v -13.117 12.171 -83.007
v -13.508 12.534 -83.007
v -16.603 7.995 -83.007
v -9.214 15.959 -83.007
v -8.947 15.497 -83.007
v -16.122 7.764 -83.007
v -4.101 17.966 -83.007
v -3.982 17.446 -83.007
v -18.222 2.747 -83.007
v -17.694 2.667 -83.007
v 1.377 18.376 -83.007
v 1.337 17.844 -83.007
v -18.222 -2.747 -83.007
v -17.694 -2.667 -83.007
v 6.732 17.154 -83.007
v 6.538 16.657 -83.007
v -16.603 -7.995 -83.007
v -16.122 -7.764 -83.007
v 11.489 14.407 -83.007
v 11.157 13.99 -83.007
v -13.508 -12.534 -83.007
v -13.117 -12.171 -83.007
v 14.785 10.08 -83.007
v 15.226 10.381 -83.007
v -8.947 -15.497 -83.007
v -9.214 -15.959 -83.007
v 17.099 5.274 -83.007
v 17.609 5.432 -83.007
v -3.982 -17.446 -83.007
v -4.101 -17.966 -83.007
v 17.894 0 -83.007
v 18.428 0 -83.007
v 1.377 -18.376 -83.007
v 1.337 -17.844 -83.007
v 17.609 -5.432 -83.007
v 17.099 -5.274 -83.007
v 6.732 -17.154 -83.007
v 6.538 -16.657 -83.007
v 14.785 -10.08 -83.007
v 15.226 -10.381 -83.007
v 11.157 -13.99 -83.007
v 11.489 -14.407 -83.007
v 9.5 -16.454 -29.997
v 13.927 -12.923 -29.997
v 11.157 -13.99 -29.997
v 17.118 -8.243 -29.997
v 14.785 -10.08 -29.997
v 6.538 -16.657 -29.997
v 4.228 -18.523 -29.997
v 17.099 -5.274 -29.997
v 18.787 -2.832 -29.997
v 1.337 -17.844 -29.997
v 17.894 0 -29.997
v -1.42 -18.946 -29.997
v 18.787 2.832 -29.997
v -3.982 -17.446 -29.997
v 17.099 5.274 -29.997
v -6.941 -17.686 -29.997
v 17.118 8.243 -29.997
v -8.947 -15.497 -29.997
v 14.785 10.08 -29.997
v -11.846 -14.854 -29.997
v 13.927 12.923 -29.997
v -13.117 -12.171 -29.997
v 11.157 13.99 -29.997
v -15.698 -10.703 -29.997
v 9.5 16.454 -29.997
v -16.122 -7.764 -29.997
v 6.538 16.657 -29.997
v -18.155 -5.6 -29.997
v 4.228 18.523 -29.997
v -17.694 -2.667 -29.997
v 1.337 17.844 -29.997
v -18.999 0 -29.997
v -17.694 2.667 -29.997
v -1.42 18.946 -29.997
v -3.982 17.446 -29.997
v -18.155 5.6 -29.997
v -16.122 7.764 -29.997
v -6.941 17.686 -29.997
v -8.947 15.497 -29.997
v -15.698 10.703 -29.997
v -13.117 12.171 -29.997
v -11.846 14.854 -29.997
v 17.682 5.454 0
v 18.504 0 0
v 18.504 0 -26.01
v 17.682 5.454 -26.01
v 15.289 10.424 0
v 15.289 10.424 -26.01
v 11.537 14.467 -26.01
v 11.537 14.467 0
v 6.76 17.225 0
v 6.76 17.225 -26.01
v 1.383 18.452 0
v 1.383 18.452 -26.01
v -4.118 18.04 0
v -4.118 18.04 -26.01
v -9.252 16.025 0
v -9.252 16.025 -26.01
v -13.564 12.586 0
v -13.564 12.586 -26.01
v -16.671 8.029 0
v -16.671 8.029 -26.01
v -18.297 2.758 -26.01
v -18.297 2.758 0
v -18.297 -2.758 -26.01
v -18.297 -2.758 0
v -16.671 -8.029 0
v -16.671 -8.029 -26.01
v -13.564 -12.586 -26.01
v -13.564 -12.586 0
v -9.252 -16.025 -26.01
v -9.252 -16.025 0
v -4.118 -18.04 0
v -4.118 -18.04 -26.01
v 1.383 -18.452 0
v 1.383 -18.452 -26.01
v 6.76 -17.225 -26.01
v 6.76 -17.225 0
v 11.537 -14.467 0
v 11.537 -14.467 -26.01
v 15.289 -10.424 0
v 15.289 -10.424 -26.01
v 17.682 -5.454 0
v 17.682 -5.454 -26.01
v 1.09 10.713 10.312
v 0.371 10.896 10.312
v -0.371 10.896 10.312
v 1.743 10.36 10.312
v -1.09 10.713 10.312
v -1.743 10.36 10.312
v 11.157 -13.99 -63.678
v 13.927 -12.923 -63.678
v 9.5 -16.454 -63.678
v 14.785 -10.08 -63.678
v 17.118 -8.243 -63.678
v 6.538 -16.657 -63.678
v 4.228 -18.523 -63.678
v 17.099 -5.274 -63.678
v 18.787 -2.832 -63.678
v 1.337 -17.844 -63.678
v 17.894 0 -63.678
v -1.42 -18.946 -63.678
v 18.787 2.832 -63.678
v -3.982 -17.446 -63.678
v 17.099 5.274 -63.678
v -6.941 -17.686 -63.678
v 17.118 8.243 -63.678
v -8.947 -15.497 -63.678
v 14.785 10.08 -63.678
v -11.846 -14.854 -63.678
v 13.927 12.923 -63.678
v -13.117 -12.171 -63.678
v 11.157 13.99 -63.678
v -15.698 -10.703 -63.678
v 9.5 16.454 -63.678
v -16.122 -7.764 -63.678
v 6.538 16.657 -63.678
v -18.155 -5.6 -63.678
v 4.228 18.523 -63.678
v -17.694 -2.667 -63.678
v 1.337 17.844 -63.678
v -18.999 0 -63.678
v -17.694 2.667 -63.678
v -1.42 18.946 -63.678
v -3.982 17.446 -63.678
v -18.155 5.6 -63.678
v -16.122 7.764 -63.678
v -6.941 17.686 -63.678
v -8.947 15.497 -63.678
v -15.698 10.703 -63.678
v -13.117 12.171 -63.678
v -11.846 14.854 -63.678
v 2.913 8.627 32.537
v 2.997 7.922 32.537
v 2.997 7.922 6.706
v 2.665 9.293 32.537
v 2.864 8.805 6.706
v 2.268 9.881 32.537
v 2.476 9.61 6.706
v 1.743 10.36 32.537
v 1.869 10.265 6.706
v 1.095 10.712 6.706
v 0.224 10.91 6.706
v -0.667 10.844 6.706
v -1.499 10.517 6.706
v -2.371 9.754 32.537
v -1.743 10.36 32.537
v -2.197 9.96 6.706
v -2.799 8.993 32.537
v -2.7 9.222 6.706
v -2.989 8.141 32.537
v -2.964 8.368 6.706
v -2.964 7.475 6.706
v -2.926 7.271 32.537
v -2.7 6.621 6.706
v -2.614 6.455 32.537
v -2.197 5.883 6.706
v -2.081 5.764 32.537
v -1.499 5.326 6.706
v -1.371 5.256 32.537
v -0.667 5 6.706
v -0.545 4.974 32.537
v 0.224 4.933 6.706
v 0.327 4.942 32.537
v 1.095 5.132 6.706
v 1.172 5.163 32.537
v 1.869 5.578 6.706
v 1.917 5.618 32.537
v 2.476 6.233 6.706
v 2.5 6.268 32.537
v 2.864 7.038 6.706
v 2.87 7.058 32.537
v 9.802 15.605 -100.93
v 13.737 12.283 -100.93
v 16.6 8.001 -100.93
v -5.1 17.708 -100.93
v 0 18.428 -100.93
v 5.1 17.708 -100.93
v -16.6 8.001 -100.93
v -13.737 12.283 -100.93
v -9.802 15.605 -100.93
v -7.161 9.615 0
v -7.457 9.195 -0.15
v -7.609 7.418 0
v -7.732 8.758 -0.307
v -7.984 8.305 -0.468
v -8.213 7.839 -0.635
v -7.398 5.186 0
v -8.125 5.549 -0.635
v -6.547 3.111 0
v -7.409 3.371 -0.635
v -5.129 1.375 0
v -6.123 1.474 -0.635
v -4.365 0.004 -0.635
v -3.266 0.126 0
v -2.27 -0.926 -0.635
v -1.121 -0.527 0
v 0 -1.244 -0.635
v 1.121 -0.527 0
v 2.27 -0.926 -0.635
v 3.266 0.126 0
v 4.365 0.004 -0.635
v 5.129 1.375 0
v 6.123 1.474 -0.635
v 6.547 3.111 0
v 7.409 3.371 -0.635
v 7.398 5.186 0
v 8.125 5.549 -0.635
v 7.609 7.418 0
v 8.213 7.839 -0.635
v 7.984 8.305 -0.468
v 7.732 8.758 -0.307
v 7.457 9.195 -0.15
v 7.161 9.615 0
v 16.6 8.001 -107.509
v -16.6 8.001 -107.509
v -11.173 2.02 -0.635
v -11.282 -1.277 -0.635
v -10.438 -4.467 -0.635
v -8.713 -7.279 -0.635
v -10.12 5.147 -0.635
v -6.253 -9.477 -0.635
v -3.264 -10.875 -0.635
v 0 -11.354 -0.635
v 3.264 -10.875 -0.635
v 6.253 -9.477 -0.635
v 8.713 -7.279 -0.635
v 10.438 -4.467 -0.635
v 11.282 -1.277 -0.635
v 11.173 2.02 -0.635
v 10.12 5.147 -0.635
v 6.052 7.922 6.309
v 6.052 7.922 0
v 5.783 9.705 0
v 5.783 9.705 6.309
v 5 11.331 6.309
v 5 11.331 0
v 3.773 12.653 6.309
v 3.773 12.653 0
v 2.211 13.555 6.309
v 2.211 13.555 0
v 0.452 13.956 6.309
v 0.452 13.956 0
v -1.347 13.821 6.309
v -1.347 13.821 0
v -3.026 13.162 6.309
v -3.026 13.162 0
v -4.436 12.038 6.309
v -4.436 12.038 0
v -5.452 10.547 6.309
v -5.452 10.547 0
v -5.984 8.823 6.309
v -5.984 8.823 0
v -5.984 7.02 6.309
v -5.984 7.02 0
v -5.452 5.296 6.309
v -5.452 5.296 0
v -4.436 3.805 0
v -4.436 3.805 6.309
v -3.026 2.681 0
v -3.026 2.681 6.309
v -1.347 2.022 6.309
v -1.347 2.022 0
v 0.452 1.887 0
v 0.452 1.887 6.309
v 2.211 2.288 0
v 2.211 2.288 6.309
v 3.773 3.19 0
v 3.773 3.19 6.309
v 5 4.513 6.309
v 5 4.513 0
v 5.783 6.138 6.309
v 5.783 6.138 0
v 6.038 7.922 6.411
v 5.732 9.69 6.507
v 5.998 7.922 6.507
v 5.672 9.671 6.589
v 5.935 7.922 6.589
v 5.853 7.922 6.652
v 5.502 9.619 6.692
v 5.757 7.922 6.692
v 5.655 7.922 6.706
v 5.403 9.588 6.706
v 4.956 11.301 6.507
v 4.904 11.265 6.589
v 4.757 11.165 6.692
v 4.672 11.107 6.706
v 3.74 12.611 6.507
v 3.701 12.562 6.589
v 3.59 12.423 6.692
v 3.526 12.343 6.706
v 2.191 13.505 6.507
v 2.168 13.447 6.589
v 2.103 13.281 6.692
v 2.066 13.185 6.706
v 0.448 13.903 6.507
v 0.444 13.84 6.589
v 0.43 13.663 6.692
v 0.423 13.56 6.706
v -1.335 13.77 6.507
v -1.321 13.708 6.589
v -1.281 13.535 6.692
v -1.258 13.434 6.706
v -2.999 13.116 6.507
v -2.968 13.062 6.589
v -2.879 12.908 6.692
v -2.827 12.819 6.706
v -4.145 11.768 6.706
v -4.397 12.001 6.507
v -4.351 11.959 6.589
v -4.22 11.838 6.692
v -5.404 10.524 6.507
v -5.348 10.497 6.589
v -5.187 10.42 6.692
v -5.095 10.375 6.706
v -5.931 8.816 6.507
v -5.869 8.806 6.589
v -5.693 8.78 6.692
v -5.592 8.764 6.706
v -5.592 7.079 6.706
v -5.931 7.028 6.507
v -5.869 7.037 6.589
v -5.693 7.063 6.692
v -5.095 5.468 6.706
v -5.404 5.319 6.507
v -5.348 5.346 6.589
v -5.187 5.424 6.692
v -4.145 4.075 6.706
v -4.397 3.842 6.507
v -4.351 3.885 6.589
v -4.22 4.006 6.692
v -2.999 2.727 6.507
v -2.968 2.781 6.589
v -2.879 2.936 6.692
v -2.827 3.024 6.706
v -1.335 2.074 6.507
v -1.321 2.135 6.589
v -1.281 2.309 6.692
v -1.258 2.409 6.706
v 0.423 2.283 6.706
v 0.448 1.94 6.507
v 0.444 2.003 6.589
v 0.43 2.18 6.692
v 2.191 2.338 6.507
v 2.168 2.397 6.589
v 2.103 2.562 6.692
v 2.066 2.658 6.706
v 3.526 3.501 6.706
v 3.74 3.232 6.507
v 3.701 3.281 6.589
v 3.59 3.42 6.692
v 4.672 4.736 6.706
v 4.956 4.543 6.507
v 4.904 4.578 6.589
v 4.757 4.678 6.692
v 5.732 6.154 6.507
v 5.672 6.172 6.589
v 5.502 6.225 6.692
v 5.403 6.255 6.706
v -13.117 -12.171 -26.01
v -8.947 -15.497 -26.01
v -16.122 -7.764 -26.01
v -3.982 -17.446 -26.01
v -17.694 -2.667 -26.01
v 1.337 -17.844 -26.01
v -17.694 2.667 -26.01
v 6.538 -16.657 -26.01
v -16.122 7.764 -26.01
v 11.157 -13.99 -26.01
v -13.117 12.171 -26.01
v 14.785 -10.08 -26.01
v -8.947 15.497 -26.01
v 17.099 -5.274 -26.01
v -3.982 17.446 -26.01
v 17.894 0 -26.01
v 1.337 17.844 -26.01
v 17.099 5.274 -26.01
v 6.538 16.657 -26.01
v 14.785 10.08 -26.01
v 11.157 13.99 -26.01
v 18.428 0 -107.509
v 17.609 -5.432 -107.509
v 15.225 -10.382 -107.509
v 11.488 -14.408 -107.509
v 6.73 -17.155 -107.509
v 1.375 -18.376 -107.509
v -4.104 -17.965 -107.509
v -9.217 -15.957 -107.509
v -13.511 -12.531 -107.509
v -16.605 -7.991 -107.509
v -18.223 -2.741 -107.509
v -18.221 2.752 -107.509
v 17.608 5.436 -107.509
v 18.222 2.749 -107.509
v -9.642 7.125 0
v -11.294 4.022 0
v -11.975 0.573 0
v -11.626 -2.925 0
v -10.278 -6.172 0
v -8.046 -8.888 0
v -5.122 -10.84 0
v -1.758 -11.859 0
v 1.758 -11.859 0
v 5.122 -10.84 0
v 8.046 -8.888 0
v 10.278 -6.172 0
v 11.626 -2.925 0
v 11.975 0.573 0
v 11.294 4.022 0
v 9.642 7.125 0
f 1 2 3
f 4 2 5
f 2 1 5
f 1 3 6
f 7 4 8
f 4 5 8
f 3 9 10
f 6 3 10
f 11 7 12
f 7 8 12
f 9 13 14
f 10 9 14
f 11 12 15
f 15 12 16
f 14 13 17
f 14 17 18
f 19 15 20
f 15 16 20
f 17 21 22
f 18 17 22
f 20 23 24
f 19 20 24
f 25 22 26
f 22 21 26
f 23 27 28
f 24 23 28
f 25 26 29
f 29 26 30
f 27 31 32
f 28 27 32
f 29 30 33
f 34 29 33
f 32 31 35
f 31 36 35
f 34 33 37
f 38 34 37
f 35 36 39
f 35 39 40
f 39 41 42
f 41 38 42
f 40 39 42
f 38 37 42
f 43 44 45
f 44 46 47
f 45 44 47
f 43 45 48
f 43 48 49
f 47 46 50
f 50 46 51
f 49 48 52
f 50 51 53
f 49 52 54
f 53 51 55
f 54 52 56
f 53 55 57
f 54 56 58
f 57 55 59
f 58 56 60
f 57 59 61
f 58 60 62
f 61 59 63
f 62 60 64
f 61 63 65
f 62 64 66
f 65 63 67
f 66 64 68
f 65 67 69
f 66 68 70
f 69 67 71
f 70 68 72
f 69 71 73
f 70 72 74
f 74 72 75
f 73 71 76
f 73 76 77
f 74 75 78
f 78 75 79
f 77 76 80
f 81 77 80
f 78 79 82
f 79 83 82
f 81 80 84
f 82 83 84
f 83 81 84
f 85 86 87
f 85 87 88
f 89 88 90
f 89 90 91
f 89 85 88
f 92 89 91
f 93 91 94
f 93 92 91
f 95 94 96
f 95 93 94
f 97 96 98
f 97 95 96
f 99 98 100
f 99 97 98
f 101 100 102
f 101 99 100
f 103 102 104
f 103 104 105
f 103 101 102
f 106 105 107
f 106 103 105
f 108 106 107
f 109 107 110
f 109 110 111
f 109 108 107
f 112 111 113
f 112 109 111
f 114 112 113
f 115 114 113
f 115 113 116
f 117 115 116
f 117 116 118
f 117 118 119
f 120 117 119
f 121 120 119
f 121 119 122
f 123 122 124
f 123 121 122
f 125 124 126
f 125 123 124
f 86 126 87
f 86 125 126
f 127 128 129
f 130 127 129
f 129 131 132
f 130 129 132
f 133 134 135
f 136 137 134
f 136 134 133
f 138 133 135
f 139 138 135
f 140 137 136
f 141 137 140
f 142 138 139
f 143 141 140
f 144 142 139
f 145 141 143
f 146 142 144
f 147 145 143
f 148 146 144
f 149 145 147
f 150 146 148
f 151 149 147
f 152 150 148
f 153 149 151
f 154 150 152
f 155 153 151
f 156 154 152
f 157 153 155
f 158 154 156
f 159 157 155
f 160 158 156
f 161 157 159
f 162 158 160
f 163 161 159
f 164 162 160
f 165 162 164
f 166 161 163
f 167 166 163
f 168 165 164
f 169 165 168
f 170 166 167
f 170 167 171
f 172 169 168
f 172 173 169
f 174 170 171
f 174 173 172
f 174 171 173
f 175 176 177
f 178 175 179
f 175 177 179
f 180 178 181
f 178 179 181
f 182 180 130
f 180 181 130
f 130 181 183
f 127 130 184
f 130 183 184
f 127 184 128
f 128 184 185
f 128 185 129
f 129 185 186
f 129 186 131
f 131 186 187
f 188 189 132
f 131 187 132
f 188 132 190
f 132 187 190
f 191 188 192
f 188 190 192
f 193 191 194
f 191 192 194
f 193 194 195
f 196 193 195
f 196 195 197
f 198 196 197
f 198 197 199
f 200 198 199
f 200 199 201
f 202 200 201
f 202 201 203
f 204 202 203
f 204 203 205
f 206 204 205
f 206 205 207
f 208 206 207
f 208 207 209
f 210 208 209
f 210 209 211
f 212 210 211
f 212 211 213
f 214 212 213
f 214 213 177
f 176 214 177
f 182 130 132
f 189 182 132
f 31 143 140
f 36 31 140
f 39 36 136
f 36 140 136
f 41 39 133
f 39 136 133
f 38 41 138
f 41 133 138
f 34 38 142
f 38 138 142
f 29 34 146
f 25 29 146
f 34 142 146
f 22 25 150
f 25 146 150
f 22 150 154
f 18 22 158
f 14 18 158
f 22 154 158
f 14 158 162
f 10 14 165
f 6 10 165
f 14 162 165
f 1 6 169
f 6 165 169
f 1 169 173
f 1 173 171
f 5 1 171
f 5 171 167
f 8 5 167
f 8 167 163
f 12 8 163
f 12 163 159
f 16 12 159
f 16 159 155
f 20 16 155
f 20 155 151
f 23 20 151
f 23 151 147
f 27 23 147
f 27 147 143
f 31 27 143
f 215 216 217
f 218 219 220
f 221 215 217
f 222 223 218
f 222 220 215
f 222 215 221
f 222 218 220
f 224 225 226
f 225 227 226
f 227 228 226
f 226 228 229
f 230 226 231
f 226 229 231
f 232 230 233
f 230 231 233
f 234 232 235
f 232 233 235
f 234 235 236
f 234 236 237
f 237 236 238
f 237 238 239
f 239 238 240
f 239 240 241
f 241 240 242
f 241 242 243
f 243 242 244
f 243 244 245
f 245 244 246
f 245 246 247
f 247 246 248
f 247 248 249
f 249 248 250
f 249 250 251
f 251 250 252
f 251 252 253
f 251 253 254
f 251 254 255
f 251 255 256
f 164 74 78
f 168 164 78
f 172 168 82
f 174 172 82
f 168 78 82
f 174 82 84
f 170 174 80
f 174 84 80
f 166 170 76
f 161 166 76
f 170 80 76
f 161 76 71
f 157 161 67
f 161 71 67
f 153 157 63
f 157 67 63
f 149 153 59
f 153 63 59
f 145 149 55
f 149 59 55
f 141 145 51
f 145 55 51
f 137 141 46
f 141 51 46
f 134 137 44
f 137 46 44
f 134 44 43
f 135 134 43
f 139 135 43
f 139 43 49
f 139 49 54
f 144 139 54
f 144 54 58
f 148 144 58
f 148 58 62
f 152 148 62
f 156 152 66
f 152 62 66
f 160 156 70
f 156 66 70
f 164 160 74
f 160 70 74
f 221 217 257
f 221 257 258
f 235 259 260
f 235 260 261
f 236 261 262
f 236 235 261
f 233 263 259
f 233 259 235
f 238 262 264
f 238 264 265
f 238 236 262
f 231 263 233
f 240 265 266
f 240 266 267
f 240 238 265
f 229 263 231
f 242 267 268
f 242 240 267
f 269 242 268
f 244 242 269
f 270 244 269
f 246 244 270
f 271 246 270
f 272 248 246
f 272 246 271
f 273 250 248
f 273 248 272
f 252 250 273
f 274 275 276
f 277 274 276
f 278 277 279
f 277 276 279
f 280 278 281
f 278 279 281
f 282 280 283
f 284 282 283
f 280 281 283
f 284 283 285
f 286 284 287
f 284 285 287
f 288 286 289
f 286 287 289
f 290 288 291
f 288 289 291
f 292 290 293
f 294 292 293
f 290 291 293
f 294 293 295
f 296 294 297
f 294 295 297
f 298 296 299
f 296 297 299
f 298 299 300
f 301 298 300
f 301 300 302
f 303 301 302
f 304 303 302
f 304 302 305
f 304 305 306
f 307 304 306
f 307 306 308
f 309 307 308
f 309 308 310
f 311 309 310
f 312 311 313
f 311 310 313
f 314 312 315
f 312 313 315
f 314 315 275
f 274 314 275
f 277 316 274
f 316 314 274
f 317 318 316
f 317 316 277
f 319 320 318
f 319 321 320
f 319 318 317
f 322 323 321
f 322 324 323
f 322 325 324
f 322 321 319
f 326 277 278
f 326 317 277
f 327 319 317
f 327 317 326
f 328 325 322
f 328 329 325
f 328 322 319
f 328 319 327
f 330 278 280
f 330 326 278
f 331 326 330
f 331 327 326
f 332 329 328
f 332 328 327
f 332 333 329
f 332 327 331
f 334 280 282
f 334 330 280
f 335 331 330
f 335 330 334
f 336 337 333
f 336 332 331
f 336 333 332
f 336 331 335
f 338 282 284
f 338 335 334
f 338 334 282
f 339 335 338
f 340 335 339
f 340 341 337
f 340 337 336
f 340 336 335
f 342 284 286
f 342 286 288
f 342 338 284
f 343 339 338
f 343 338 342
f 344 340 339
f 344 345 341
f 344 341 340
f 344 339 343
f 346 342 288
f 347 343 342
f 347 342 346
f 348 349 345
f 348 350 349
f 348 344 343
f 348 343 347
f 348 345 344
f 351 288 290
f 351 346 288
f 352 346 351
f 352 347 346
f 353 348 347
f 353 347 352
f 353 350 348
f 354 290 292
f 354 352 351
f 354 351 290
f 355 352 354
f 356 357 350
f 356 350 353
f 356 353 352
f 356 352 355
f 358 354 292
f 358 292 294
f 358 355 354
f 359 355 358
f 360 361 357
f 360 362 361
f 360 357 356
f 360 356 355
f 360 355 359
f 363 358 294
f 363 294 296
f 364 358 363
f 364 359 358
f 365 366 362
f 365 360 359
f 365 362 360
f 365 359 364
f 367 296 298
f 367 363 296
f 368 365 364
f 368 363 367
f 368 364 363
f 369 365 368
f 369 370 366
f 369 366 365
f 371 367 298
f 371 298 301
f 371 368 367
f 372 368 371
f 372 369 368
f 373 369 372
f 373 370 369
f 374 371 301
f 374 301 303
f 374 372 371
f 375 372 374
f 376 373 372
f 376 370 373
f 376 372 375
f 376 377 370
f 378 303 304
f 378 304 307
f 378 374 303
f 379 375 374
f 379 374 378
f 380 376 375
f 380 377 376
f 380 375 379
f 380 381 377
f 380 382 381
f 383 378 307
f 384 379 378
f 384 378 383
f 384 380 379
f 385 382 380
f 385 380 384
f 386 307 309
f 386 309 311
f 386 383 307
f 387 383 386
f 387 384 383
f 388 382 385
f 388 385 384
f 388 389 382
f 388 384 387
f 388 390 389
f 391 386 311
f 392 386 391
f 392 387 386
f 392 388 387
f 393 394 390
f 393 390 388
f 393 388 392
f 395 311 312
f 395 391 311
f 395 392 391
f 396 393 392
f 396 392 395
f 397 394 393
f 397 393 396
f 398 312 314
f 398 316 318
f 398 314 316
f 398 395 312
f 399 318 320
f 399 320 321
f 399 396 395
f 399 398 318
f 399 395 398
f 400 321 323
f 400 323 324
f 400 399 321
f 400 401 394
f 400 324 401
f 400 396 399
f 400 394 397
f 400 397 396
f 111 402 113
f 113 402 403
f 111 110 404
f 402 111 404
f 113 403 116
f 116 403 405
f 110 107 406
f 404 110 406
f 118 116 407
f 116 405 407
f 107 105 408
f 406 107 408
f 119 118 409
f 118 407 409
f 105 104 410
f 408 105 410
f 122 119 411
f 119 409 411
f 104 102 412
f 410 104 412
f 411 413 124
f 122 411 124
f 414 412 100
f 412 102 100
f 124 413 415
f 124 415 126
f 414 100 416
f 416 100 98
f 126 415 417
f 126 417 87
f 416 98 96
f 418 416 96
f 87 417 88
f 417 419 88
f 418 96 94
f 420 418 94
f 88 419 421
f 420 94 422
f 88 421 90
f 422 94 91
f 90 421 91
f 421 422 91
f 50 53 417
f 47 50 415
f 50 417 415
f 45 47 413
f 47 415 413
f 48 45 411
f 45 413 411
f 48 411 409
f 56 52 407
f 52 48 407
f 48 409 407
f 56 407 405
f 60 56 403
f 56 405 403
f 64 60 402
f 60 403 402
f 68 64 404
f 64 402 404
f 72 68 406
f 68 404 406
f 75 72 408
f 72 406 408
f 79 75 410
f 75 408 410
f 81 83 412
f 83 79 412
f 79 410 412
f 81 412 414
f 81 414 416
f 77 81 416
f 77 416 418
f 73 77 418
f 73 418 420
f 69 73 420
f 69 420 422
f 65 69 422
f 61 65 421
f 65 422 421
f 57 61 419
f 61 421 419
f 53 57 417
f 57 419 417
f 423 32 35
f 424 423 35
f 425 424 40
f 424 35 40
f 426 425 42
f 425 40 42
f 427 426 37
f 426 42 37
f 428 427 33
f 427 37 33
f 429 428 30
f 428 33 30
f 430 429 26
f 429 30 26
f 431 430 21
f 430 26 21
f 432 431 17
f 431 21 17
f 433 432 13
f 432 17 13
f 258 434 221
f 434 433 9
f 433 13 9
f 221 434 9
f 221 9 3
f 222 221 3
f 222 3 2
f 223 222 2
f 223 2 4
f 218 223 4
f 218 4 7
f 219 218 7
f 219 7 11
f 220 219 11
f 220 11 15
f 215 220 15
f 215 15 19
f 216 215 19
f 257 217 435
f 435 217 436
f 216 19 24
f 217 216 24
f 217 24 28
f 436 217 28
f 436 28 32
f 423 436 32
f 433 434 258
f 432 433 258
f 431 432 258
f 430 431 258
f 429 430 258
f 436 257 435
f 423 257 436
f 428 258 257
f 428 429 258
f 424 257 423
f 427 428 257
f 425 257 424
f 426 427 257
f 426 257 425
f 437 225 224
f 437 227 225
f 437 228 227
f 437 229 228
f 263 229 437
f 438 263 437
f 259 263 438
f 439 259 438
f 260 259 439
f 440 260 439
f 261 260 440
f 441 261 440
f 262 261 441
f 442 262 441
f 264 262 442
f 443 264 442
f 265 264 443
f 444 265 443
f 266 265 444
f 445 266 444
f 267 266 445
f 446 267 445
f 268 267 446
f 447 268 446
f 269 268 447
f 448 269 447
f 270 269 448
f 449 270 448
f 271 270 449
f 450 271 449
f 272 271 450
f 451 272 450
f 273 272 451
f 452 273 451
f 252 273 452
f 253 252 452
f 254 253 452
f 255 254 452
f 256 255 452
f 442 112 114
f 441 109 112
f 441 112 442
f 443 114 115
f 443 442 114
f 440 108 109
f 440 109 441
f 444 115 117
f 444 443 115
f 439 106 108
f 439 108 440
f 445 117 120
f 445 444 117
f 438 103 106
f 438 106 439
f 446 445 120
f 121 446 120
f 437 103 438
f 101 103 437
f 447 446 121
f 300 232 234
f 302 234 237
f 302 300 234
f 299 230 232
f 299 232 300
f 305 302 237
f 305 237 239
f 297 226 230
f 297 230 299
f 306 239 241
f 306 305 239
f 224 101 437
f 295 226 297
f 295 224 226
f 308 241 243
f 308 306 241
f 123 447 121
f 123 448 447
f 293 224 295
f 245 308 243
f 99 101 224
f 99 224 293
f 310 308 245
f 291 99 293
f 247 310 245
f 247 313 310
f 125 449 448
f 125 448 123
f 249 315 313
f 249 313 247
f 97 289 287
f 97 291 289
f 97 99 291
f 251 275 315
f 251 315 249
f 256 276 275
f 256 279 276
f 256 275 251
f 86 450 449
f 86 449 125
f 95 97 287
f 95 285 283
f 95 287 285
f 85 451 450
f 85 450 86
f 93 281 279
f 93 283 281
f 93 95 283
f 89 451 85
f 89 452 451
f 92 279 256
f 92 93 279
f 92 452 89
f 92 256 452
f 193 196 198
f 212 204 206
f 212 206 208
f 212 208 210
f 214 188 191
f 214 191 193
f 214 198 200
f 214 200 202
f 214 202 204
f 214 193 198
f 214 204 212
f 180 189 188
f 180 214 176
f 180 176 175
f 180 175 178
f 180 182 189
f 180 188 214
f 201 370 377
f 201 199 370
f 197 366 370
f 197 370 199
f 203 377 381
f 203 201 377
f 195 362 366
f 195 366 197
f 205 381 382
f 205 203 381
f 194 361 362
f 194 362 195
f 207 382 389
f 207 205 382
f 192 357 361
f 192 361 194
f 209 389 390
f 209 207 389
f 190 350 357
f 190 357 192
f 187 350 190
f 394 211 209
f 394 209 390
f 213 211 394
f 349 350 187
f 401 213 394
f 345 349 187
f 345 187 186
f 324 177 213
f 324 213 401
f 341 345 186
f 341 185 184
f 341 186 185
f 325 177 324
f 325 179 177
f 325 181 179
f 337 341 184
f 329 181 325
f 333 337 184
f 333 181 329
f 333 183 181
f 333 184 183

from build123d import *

# Parameters (mm, degrees)
SKETCH1_R            = 18.5039
GEARBOX_DEPTH        = 26.0096
SKETCH2_R            = 17.8943
BOSS_EXTRUDE2_DEPTH  = 56.9976
SKETCH3_R            = 18.9992
WRAP_DEPTH           = 33.6804
SKETCH4_R            = 18.4277
BOSS_EXTRUDE4_DEPTH  = 24.501601563
CONNECTDOR_START     = -6.5786
CONNECTDOR_CUT_DEPTH = 6.5786
SKETCH6_R            = 11.9888
CENTER_DISH_DEPTH    = 0.635
SKETCH7_R            = 7.62
BOSS_EXTRUDE5_DEPTH  = 0.635
CHAMFER4_SIZE        = 0.635
CHAMFER5_SIZE        = 0.635
SKETCH8_R            = 6.05155
SHAFT_COLLAR_DEPTH   = 6.7056
FILLET1_R            = 0.396875
SKETCH9_R            = 2.9972
BOSS_EXTRUDE7_DEPTH  = 25.8318
CUT_EXTRUDE3_START   = -22.225
CUT_EXTRUDE3_DEPTH   = 22.225


with BuildPart() as part:
    # Sketch1 → Gearbox (new body)
    with BuildSketch(Plane.XY):
        Circle(SKETCH1_R)
    extrude(amount=-GEARBOX_DEPTH)

    # Sketch2 → Boss-Extrude2 (add)
    with BuildSketch(Plane(origin=(0, 0, -26.0096), x_dir=(-1, 0, 0), z_dir=(0, 0, -1))):
        with Locations(Location((0, 0, 0), (0, 0, 180))):
            Circle(SKETCH2_R)
    extrude(amount=BOSS_EXTRUDE2_DEPTH)

    # Sketch3 → Wrap (add)
    with BuildSketch(Plane(origin=(0, 0, -29.9974), x_dir=(-1, 0, 0), z_dir=(0, 0, -1))):
        Circle(SKETCH3_R)
    extrude(amount=WRAP_DEPTH)

    # Sketch4 → Boss-Extrude4 (add)
    with BuildSketch(Plane(origin=(0, 0, -83.0072), x_dir=(-1, 0, 0), z_dir=(0, 0, -1))):
        with Locations(Location((0, 0, 0), (0, 0, 180))):
            Circle(SKETCH4_R)
    extrude(amount=BOSS_EXTRUDE4_DEPTH)

    # Connector → Connectdor Cut (cut)
    with BuildSketch(Plane(origin=(0, 0, -107.508801563), x_dir=(-1, 0, 0), z_dir=(0, 0, -1)).offset(CONNECTDOR_START)):
        with BuildLine():
            Line((0, 8.001), (16.600124285, 8.001))
            ThreePointArc((16.600124285, 8.001), (0, 18.4277), (-16.600124285, 8.001))
            Line((-16.600124285, 8.001), (0, 8.001))
        make_face()
    extrude(amount=CONNECTDOR_CUT_DEPTH, mode=Mode.SUBTRACT)

    # Sketch6 → Center DIsh (cut)
    with BuildSketch(Plane.XY):
        Circle(SKETCH6_R)
    extrude(amount=-CENTER_DISH_DEPTH, mode=Mode.SUBTRACT)

    # Sketch7 → Boss-Extrude5 (add)
    with BuildSketch(Plane.XY.offset(-0.635)):
        with Locations((0, 7.0104)):
            Circle(SKETCH7_R)
    extrude(amount=BOSS_EXTRUDE5_DEPTH)

    # Chamfer4
    chamfer4_edges = [part.edges().sort_by_distance(p)[0] for p in [
        (0, -0.6096, -0.635),
    ]]
    chamfer(chamfer4_edges, length=CHAMFER4_SIZE - 0.0001)  # a hair under: the kernel refuses the full size

    # Chamfer5
    chamfer5_edges = [part.edges().sort_by_distance(p)[0] for p in [
        (0, -11.9888, -0.635),
    ]]
    chamfer(chamfer5_edges, length=CHAMFER5_SIZE - 0.0001)  # a hair under: the kernel refuses the full size

    # Sketch8 → Shaft Collar (add)
    with BuildSketch(Plane.XY):
        with Locations((0, 7.92156223)):
            Circle(SKETCH8_R)
    extrude(amount=SHAFT_COLLAR_DEPTH)

    # Fillet1
    fillet1_edges = [part.edges().sort_by_distance(p)[0] for p in [
        (-6.05155, 7.92156223, 6.7056),
    ]]
    fillet(fillet1_edges, radius=FILLET1_R)

    # Sketch9 → Boss-Extrude7 (add)
    with BuildSketch(Plane.XY.offset(6.7056)):
        with Locations((0, 7.92156223)):
            Circle(SKETCH9_R)
    extrude(amount=BOSS_EXTRUDE7_DEPTH)

    # Sketch10 → Cut-Extrude3 (cut)
    with BuildSketch(Plane.XY.offset(32.5374).offset(CUT_EXTRUDE3_START)):
        with BuildLine():
            Line((0, 10.35996223), (-1.742817627, 10.35996223))
            ThreePointArc((-1.742817627, 10.35996223), (0, 10.91876223), (1.742817627, 10.35996223))
            Line((1.742817627, 10.35996223), (0, 10.35996223))
        make_face()
    extrude(amount=CUT_EXTRUDE3_DEPTH, mode=Mode.SUBTRACT)


solid = part.part
